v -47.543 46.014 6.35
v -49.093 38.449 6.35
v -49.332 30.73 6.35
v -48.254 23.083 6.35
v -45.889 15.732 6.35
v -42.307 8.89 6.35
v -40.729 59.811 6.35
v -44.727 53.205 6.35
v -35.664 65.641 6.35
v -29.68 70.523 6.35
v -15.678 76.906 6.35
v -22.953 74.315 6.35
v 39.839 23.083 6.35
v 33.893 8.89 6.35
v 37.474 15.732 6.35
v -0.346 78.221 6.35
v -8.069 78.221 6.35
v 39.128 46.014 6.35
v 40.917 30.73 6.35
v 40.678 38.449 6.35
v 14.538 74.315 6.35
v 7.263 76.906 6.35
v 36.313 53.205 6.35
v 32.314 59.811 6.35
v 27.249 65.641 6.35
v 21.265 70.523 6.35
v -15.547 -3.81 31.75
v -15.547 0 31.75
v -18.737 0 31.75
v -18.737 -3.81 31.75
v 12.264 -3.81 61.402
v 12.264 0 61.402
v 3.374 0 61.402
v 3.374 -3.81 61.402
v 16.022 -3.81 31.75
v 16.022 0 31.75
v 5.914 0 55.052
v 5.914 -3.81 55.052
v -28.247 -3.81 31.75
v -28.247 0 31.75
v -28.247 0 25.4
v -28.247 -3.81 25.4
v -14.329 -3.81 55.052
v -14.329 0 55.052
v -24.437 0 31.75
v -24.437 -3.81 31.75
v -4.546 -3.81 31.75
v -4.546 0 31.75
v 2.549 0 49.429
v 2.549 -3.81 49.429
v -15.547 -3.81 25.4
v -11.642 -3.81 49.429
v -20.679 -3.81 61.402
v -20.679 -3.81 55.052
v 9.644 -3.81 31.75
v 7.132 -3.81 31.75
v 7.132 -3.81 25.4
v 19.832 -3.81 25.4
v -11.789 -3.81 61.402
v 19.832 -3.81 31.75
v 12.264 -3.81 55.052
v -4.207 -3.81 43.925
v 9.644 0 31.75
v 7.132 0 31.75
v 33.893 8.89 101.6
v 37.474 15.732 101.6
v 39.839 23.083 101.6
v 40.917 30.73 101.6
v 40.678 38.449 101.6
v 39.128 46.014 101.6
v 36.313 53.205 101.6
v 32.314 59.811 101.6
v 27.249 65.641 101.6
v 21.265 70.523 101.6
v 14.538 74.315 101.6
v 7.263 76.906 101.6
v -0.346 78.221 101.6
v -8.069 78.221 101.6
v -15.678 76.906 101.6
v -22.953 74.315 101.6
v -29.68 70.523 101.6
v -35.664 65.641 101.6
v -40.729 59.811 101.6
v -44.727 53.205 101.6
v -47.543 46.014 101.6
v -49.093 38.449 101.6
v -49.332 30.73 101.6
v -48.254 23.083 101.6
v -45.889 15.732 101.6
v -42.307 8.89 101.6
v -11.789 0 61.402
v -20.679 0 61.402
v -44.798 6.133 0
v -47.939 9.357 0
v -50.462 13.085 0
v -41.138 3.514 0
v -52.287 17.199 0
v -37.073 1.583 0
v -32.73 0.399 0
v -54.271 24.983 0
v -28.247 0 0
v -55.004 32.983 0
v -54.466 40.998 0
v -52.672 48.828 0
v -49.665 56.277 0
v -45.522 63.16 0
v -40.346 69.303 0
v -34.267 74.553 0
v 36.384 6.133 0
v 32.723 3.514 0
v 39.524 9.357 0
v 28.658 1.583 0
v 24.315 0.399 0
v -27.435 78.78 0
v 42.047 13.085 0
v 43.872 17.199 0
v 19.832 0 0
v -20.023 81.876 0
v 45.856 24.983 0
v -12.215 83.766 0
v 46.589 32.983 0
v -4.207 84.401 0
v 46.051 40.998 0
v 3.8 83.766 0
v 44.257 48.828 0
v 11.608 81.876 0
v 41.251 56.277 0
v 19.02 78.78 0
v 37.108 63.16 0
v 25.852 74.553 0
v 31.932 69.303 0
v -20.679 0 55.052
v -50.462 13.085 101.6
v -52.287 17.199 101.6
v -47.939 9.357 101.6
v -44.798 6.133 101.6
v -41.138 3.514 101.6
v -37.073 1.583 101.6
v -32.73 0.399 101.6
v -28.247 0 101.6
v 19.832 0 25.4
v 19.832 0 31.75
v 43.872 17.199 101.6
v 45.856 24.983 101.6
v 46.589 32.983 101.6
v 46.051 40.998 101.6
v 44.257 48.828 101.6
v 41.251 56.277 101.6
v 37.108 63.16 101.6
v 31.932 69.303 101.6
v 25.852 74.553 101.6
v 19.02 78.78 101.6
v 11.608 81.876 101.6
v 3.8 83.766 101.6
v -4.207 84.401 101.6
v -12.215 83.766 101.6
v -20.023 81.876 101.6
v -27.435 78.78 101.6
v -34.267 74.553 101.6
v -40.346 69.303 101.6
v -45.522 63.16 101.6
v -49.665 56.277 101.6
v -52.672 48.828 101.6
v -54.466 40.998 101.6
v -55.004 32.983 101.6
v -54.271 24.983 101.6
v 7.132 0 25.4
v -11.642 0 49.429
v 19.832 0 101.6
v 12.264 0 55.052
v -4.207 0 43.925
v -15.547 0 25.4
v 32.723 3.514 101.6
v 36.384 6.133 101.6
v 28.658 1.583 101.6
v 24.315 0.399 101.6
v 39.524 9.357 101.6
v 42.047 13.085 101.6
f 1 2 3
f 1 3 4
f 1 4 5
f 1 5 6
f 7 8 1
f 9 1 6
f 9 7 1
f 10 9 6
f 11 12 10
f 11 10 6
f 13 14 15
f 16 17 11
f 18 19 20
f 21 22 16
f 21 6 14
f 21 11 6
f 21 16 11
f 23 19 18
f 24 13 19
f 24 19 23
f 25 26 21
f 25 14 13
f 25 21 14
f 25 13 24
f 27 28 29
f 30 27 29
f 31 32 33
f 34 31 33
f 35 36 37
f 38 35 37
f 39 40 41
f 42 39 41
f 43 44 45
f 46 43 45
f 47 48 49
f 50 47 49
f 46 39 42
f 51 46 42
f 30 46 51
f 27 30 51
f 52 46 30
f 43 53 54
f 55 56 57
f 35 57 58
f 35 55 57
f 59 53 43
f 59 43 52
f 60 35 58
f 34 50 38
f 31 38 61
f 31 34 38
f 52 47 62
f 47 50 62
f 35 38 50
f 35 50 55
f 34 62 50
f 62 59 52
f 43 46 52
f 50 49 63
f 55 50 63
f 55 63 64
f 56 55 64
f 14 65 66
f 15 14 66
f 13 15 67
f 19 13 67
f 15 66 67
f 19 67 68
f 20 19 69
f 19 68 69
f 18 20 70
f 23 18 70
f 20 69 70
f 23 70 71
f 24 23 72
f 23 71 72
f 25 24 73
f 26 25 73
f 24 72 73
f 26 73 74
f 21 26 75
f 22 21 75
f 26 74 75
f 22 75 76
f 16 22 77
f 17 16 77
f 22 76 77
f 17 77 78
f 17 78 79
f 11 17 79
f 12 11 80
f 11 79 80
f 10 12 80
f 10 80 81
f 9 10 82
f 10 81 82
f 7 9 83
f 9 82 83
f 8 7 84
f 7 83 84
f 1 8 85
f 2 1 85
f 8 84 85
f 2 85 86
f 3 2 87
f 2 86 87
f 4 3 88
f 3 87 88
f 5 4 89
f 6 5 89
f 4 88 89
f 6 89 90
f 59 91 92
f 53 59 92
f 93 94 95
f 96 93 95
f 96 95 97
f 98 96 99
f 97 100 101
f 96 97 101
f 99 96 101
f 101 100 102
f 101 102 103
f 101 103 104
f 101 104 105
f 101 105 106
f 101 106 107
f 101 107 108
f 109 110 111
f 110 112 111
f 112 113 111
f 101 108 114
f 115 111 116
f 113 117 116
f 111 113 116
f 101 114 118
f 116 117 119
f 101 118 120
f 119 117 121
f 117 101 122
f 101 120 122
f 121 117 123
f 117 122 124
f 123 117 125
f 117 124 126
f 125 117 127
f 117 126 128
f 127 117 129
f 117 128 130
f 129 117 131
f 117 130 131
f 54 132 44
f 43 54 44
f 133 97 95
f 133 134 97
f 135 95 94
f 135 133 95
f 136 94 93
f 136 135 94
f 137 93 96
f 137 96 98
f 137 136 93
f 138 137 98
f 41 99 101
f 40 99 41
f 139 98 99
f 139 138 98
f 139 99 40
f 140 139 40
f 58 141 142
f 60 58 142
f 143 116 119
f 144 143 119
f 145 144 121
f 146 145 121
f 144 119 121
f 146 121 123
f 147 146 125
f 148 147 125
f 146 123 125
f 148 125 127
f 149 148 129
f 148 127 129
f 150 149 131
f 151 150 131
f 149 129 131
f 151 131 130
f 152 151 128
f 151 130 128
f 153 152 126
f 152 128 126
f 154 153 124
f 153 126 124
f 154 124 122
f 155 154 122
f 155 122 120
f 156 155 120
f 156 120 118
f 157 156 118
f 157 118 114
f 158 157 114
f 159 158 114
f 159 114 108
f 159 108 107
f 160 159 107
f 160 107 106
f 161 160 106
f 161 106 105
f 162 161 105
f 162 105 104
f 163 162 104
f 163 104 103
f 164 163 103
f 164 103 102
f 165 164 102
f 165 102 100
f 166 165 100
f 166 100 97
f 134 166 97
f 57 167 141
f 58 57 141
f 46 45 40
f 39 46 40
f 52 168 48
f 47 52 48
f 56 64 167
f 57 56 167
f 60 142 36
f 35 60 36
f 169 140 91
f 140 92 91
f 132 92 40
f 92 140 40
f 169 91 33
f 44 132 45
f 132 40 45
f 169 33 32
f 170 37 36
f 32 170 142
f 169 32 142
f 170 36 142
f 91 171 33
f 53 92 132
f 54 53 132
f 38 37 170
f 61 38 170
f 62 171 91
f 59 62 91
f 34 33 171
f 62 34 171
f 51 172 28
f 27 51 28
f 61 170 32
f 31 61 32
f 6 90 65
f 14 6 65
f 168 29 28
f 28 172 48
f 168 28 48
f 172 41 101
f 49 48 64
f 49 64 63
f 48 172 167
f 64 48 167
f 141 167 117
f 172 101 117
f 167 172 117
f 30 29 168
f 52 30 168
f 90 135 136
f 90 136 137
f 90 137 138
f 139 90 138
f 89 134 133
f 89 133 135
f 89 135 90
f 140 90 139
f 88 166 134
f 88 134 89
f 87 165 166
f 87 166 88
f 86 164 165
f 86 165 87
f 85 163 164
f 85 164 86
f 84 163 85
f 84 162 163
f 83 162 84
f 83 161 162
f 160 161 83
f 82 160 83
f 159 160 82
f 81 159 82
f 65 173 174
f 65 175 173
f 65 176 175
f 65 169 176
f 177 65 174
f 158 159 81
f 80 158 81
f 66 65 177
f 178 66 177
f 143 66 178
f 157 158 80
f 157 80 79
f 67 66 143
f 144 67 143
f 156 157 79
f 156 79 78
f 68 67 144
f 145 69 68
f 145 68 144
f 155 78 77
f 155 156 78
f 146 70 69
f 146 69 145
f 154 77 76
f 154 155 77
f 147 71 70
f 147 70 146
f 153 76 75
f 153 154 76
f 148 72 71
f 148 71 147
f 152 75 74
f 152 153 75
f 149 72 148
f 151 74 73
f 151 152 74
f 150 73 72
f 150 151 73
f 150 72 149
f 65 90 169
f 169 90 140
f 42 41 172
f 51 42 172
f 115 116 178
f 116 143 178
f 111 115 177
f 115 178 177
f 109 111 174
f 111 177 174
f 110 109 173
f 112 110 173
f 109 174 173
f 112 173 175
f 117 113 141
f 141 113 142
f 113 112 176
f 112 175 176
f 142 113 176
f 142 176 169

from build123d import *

# Parameters (mm, degrees)
F1_DEPTH = 101.6
F3_DEPTH = 95.25
F4_R     = 25.4
F6_DEPTH = 3.81


# Not quite as in the source:
# - a feature names something its author has since deleted; it is built from what else it names


with BuildPart() as f1:
    # F0 (on Top) → F1 (new body)
    with BuildSketch(Plane.XY):
        with BuildLine():
            ThreePointArc((33.8925523579, 0), (-4.2074476421, 84.4010416505), (-42.3074476421, 0))
            Line((-42.3074476421, 0), (33.8925523579, 0))
        make_face()
    extrude(amount=F1_DEPTH)

    # F2 (on face) → F3 (cut)
    with BuildSketch(Plane.XY.offset(101.6)):
        with BuildLine():
            ThreePointArc((33.8925523579, 8.89), (-4.2074476421, 78.3858036913), (-42.3074476421, 8.89))
            Line((-42.3074476421, 8.89), (33.8925523579, 8.89))
        make_face()
    extrude(amount=-F3_DEPTH, mode=Mode.SUBTRACT)

    # F4
    f4_edges = [f1.edges().sort_by_distance(p)[0] for p in [
        (-42.307448, 0, 50.8),
        (33.892552, 0, 50.8),
    ]]
    fillet(f4_edges, radius=F4_R)

    # F5 (on face) → F6 (join)
    with BuildSketch(Plane.XZ):
        Polygon((-28.2470590334, 31.75), (-28.2470590334, 25.4), (-15.5470590334, 25.4), (-15.5470590334, 31.75), (-18.7367527627, 31.75), (-11.6416137586, 49.4294089978), (-4.5464747545, 31.75), (2.5486642496, 49.4294089978), (9.6438032537, 31.75), (7.1321637492, 31.75), (7.1321637492, 25.4), (19.8321637492, 25.4), (19.8321637492, 31.75), (16.0221637492, 31.75), (5.9138143828, 55.0519585676), (12.2638143828, 55.0519585676), (12.2638143828, 61.4019585676), (3.3738143828, 61.4019585676), (-4.2074476421, 43.9254896419), (-11.7887096669, 61.4019585676), (-20.6787096669, 61.4019585676), (-20.6787096669, 55.0519585676), (-14.3287096669, 55.0519585676), (-24.4370590334, 31.75), align=None)
    extrude(amount=F6_DEPTH)


solid = f1.part
